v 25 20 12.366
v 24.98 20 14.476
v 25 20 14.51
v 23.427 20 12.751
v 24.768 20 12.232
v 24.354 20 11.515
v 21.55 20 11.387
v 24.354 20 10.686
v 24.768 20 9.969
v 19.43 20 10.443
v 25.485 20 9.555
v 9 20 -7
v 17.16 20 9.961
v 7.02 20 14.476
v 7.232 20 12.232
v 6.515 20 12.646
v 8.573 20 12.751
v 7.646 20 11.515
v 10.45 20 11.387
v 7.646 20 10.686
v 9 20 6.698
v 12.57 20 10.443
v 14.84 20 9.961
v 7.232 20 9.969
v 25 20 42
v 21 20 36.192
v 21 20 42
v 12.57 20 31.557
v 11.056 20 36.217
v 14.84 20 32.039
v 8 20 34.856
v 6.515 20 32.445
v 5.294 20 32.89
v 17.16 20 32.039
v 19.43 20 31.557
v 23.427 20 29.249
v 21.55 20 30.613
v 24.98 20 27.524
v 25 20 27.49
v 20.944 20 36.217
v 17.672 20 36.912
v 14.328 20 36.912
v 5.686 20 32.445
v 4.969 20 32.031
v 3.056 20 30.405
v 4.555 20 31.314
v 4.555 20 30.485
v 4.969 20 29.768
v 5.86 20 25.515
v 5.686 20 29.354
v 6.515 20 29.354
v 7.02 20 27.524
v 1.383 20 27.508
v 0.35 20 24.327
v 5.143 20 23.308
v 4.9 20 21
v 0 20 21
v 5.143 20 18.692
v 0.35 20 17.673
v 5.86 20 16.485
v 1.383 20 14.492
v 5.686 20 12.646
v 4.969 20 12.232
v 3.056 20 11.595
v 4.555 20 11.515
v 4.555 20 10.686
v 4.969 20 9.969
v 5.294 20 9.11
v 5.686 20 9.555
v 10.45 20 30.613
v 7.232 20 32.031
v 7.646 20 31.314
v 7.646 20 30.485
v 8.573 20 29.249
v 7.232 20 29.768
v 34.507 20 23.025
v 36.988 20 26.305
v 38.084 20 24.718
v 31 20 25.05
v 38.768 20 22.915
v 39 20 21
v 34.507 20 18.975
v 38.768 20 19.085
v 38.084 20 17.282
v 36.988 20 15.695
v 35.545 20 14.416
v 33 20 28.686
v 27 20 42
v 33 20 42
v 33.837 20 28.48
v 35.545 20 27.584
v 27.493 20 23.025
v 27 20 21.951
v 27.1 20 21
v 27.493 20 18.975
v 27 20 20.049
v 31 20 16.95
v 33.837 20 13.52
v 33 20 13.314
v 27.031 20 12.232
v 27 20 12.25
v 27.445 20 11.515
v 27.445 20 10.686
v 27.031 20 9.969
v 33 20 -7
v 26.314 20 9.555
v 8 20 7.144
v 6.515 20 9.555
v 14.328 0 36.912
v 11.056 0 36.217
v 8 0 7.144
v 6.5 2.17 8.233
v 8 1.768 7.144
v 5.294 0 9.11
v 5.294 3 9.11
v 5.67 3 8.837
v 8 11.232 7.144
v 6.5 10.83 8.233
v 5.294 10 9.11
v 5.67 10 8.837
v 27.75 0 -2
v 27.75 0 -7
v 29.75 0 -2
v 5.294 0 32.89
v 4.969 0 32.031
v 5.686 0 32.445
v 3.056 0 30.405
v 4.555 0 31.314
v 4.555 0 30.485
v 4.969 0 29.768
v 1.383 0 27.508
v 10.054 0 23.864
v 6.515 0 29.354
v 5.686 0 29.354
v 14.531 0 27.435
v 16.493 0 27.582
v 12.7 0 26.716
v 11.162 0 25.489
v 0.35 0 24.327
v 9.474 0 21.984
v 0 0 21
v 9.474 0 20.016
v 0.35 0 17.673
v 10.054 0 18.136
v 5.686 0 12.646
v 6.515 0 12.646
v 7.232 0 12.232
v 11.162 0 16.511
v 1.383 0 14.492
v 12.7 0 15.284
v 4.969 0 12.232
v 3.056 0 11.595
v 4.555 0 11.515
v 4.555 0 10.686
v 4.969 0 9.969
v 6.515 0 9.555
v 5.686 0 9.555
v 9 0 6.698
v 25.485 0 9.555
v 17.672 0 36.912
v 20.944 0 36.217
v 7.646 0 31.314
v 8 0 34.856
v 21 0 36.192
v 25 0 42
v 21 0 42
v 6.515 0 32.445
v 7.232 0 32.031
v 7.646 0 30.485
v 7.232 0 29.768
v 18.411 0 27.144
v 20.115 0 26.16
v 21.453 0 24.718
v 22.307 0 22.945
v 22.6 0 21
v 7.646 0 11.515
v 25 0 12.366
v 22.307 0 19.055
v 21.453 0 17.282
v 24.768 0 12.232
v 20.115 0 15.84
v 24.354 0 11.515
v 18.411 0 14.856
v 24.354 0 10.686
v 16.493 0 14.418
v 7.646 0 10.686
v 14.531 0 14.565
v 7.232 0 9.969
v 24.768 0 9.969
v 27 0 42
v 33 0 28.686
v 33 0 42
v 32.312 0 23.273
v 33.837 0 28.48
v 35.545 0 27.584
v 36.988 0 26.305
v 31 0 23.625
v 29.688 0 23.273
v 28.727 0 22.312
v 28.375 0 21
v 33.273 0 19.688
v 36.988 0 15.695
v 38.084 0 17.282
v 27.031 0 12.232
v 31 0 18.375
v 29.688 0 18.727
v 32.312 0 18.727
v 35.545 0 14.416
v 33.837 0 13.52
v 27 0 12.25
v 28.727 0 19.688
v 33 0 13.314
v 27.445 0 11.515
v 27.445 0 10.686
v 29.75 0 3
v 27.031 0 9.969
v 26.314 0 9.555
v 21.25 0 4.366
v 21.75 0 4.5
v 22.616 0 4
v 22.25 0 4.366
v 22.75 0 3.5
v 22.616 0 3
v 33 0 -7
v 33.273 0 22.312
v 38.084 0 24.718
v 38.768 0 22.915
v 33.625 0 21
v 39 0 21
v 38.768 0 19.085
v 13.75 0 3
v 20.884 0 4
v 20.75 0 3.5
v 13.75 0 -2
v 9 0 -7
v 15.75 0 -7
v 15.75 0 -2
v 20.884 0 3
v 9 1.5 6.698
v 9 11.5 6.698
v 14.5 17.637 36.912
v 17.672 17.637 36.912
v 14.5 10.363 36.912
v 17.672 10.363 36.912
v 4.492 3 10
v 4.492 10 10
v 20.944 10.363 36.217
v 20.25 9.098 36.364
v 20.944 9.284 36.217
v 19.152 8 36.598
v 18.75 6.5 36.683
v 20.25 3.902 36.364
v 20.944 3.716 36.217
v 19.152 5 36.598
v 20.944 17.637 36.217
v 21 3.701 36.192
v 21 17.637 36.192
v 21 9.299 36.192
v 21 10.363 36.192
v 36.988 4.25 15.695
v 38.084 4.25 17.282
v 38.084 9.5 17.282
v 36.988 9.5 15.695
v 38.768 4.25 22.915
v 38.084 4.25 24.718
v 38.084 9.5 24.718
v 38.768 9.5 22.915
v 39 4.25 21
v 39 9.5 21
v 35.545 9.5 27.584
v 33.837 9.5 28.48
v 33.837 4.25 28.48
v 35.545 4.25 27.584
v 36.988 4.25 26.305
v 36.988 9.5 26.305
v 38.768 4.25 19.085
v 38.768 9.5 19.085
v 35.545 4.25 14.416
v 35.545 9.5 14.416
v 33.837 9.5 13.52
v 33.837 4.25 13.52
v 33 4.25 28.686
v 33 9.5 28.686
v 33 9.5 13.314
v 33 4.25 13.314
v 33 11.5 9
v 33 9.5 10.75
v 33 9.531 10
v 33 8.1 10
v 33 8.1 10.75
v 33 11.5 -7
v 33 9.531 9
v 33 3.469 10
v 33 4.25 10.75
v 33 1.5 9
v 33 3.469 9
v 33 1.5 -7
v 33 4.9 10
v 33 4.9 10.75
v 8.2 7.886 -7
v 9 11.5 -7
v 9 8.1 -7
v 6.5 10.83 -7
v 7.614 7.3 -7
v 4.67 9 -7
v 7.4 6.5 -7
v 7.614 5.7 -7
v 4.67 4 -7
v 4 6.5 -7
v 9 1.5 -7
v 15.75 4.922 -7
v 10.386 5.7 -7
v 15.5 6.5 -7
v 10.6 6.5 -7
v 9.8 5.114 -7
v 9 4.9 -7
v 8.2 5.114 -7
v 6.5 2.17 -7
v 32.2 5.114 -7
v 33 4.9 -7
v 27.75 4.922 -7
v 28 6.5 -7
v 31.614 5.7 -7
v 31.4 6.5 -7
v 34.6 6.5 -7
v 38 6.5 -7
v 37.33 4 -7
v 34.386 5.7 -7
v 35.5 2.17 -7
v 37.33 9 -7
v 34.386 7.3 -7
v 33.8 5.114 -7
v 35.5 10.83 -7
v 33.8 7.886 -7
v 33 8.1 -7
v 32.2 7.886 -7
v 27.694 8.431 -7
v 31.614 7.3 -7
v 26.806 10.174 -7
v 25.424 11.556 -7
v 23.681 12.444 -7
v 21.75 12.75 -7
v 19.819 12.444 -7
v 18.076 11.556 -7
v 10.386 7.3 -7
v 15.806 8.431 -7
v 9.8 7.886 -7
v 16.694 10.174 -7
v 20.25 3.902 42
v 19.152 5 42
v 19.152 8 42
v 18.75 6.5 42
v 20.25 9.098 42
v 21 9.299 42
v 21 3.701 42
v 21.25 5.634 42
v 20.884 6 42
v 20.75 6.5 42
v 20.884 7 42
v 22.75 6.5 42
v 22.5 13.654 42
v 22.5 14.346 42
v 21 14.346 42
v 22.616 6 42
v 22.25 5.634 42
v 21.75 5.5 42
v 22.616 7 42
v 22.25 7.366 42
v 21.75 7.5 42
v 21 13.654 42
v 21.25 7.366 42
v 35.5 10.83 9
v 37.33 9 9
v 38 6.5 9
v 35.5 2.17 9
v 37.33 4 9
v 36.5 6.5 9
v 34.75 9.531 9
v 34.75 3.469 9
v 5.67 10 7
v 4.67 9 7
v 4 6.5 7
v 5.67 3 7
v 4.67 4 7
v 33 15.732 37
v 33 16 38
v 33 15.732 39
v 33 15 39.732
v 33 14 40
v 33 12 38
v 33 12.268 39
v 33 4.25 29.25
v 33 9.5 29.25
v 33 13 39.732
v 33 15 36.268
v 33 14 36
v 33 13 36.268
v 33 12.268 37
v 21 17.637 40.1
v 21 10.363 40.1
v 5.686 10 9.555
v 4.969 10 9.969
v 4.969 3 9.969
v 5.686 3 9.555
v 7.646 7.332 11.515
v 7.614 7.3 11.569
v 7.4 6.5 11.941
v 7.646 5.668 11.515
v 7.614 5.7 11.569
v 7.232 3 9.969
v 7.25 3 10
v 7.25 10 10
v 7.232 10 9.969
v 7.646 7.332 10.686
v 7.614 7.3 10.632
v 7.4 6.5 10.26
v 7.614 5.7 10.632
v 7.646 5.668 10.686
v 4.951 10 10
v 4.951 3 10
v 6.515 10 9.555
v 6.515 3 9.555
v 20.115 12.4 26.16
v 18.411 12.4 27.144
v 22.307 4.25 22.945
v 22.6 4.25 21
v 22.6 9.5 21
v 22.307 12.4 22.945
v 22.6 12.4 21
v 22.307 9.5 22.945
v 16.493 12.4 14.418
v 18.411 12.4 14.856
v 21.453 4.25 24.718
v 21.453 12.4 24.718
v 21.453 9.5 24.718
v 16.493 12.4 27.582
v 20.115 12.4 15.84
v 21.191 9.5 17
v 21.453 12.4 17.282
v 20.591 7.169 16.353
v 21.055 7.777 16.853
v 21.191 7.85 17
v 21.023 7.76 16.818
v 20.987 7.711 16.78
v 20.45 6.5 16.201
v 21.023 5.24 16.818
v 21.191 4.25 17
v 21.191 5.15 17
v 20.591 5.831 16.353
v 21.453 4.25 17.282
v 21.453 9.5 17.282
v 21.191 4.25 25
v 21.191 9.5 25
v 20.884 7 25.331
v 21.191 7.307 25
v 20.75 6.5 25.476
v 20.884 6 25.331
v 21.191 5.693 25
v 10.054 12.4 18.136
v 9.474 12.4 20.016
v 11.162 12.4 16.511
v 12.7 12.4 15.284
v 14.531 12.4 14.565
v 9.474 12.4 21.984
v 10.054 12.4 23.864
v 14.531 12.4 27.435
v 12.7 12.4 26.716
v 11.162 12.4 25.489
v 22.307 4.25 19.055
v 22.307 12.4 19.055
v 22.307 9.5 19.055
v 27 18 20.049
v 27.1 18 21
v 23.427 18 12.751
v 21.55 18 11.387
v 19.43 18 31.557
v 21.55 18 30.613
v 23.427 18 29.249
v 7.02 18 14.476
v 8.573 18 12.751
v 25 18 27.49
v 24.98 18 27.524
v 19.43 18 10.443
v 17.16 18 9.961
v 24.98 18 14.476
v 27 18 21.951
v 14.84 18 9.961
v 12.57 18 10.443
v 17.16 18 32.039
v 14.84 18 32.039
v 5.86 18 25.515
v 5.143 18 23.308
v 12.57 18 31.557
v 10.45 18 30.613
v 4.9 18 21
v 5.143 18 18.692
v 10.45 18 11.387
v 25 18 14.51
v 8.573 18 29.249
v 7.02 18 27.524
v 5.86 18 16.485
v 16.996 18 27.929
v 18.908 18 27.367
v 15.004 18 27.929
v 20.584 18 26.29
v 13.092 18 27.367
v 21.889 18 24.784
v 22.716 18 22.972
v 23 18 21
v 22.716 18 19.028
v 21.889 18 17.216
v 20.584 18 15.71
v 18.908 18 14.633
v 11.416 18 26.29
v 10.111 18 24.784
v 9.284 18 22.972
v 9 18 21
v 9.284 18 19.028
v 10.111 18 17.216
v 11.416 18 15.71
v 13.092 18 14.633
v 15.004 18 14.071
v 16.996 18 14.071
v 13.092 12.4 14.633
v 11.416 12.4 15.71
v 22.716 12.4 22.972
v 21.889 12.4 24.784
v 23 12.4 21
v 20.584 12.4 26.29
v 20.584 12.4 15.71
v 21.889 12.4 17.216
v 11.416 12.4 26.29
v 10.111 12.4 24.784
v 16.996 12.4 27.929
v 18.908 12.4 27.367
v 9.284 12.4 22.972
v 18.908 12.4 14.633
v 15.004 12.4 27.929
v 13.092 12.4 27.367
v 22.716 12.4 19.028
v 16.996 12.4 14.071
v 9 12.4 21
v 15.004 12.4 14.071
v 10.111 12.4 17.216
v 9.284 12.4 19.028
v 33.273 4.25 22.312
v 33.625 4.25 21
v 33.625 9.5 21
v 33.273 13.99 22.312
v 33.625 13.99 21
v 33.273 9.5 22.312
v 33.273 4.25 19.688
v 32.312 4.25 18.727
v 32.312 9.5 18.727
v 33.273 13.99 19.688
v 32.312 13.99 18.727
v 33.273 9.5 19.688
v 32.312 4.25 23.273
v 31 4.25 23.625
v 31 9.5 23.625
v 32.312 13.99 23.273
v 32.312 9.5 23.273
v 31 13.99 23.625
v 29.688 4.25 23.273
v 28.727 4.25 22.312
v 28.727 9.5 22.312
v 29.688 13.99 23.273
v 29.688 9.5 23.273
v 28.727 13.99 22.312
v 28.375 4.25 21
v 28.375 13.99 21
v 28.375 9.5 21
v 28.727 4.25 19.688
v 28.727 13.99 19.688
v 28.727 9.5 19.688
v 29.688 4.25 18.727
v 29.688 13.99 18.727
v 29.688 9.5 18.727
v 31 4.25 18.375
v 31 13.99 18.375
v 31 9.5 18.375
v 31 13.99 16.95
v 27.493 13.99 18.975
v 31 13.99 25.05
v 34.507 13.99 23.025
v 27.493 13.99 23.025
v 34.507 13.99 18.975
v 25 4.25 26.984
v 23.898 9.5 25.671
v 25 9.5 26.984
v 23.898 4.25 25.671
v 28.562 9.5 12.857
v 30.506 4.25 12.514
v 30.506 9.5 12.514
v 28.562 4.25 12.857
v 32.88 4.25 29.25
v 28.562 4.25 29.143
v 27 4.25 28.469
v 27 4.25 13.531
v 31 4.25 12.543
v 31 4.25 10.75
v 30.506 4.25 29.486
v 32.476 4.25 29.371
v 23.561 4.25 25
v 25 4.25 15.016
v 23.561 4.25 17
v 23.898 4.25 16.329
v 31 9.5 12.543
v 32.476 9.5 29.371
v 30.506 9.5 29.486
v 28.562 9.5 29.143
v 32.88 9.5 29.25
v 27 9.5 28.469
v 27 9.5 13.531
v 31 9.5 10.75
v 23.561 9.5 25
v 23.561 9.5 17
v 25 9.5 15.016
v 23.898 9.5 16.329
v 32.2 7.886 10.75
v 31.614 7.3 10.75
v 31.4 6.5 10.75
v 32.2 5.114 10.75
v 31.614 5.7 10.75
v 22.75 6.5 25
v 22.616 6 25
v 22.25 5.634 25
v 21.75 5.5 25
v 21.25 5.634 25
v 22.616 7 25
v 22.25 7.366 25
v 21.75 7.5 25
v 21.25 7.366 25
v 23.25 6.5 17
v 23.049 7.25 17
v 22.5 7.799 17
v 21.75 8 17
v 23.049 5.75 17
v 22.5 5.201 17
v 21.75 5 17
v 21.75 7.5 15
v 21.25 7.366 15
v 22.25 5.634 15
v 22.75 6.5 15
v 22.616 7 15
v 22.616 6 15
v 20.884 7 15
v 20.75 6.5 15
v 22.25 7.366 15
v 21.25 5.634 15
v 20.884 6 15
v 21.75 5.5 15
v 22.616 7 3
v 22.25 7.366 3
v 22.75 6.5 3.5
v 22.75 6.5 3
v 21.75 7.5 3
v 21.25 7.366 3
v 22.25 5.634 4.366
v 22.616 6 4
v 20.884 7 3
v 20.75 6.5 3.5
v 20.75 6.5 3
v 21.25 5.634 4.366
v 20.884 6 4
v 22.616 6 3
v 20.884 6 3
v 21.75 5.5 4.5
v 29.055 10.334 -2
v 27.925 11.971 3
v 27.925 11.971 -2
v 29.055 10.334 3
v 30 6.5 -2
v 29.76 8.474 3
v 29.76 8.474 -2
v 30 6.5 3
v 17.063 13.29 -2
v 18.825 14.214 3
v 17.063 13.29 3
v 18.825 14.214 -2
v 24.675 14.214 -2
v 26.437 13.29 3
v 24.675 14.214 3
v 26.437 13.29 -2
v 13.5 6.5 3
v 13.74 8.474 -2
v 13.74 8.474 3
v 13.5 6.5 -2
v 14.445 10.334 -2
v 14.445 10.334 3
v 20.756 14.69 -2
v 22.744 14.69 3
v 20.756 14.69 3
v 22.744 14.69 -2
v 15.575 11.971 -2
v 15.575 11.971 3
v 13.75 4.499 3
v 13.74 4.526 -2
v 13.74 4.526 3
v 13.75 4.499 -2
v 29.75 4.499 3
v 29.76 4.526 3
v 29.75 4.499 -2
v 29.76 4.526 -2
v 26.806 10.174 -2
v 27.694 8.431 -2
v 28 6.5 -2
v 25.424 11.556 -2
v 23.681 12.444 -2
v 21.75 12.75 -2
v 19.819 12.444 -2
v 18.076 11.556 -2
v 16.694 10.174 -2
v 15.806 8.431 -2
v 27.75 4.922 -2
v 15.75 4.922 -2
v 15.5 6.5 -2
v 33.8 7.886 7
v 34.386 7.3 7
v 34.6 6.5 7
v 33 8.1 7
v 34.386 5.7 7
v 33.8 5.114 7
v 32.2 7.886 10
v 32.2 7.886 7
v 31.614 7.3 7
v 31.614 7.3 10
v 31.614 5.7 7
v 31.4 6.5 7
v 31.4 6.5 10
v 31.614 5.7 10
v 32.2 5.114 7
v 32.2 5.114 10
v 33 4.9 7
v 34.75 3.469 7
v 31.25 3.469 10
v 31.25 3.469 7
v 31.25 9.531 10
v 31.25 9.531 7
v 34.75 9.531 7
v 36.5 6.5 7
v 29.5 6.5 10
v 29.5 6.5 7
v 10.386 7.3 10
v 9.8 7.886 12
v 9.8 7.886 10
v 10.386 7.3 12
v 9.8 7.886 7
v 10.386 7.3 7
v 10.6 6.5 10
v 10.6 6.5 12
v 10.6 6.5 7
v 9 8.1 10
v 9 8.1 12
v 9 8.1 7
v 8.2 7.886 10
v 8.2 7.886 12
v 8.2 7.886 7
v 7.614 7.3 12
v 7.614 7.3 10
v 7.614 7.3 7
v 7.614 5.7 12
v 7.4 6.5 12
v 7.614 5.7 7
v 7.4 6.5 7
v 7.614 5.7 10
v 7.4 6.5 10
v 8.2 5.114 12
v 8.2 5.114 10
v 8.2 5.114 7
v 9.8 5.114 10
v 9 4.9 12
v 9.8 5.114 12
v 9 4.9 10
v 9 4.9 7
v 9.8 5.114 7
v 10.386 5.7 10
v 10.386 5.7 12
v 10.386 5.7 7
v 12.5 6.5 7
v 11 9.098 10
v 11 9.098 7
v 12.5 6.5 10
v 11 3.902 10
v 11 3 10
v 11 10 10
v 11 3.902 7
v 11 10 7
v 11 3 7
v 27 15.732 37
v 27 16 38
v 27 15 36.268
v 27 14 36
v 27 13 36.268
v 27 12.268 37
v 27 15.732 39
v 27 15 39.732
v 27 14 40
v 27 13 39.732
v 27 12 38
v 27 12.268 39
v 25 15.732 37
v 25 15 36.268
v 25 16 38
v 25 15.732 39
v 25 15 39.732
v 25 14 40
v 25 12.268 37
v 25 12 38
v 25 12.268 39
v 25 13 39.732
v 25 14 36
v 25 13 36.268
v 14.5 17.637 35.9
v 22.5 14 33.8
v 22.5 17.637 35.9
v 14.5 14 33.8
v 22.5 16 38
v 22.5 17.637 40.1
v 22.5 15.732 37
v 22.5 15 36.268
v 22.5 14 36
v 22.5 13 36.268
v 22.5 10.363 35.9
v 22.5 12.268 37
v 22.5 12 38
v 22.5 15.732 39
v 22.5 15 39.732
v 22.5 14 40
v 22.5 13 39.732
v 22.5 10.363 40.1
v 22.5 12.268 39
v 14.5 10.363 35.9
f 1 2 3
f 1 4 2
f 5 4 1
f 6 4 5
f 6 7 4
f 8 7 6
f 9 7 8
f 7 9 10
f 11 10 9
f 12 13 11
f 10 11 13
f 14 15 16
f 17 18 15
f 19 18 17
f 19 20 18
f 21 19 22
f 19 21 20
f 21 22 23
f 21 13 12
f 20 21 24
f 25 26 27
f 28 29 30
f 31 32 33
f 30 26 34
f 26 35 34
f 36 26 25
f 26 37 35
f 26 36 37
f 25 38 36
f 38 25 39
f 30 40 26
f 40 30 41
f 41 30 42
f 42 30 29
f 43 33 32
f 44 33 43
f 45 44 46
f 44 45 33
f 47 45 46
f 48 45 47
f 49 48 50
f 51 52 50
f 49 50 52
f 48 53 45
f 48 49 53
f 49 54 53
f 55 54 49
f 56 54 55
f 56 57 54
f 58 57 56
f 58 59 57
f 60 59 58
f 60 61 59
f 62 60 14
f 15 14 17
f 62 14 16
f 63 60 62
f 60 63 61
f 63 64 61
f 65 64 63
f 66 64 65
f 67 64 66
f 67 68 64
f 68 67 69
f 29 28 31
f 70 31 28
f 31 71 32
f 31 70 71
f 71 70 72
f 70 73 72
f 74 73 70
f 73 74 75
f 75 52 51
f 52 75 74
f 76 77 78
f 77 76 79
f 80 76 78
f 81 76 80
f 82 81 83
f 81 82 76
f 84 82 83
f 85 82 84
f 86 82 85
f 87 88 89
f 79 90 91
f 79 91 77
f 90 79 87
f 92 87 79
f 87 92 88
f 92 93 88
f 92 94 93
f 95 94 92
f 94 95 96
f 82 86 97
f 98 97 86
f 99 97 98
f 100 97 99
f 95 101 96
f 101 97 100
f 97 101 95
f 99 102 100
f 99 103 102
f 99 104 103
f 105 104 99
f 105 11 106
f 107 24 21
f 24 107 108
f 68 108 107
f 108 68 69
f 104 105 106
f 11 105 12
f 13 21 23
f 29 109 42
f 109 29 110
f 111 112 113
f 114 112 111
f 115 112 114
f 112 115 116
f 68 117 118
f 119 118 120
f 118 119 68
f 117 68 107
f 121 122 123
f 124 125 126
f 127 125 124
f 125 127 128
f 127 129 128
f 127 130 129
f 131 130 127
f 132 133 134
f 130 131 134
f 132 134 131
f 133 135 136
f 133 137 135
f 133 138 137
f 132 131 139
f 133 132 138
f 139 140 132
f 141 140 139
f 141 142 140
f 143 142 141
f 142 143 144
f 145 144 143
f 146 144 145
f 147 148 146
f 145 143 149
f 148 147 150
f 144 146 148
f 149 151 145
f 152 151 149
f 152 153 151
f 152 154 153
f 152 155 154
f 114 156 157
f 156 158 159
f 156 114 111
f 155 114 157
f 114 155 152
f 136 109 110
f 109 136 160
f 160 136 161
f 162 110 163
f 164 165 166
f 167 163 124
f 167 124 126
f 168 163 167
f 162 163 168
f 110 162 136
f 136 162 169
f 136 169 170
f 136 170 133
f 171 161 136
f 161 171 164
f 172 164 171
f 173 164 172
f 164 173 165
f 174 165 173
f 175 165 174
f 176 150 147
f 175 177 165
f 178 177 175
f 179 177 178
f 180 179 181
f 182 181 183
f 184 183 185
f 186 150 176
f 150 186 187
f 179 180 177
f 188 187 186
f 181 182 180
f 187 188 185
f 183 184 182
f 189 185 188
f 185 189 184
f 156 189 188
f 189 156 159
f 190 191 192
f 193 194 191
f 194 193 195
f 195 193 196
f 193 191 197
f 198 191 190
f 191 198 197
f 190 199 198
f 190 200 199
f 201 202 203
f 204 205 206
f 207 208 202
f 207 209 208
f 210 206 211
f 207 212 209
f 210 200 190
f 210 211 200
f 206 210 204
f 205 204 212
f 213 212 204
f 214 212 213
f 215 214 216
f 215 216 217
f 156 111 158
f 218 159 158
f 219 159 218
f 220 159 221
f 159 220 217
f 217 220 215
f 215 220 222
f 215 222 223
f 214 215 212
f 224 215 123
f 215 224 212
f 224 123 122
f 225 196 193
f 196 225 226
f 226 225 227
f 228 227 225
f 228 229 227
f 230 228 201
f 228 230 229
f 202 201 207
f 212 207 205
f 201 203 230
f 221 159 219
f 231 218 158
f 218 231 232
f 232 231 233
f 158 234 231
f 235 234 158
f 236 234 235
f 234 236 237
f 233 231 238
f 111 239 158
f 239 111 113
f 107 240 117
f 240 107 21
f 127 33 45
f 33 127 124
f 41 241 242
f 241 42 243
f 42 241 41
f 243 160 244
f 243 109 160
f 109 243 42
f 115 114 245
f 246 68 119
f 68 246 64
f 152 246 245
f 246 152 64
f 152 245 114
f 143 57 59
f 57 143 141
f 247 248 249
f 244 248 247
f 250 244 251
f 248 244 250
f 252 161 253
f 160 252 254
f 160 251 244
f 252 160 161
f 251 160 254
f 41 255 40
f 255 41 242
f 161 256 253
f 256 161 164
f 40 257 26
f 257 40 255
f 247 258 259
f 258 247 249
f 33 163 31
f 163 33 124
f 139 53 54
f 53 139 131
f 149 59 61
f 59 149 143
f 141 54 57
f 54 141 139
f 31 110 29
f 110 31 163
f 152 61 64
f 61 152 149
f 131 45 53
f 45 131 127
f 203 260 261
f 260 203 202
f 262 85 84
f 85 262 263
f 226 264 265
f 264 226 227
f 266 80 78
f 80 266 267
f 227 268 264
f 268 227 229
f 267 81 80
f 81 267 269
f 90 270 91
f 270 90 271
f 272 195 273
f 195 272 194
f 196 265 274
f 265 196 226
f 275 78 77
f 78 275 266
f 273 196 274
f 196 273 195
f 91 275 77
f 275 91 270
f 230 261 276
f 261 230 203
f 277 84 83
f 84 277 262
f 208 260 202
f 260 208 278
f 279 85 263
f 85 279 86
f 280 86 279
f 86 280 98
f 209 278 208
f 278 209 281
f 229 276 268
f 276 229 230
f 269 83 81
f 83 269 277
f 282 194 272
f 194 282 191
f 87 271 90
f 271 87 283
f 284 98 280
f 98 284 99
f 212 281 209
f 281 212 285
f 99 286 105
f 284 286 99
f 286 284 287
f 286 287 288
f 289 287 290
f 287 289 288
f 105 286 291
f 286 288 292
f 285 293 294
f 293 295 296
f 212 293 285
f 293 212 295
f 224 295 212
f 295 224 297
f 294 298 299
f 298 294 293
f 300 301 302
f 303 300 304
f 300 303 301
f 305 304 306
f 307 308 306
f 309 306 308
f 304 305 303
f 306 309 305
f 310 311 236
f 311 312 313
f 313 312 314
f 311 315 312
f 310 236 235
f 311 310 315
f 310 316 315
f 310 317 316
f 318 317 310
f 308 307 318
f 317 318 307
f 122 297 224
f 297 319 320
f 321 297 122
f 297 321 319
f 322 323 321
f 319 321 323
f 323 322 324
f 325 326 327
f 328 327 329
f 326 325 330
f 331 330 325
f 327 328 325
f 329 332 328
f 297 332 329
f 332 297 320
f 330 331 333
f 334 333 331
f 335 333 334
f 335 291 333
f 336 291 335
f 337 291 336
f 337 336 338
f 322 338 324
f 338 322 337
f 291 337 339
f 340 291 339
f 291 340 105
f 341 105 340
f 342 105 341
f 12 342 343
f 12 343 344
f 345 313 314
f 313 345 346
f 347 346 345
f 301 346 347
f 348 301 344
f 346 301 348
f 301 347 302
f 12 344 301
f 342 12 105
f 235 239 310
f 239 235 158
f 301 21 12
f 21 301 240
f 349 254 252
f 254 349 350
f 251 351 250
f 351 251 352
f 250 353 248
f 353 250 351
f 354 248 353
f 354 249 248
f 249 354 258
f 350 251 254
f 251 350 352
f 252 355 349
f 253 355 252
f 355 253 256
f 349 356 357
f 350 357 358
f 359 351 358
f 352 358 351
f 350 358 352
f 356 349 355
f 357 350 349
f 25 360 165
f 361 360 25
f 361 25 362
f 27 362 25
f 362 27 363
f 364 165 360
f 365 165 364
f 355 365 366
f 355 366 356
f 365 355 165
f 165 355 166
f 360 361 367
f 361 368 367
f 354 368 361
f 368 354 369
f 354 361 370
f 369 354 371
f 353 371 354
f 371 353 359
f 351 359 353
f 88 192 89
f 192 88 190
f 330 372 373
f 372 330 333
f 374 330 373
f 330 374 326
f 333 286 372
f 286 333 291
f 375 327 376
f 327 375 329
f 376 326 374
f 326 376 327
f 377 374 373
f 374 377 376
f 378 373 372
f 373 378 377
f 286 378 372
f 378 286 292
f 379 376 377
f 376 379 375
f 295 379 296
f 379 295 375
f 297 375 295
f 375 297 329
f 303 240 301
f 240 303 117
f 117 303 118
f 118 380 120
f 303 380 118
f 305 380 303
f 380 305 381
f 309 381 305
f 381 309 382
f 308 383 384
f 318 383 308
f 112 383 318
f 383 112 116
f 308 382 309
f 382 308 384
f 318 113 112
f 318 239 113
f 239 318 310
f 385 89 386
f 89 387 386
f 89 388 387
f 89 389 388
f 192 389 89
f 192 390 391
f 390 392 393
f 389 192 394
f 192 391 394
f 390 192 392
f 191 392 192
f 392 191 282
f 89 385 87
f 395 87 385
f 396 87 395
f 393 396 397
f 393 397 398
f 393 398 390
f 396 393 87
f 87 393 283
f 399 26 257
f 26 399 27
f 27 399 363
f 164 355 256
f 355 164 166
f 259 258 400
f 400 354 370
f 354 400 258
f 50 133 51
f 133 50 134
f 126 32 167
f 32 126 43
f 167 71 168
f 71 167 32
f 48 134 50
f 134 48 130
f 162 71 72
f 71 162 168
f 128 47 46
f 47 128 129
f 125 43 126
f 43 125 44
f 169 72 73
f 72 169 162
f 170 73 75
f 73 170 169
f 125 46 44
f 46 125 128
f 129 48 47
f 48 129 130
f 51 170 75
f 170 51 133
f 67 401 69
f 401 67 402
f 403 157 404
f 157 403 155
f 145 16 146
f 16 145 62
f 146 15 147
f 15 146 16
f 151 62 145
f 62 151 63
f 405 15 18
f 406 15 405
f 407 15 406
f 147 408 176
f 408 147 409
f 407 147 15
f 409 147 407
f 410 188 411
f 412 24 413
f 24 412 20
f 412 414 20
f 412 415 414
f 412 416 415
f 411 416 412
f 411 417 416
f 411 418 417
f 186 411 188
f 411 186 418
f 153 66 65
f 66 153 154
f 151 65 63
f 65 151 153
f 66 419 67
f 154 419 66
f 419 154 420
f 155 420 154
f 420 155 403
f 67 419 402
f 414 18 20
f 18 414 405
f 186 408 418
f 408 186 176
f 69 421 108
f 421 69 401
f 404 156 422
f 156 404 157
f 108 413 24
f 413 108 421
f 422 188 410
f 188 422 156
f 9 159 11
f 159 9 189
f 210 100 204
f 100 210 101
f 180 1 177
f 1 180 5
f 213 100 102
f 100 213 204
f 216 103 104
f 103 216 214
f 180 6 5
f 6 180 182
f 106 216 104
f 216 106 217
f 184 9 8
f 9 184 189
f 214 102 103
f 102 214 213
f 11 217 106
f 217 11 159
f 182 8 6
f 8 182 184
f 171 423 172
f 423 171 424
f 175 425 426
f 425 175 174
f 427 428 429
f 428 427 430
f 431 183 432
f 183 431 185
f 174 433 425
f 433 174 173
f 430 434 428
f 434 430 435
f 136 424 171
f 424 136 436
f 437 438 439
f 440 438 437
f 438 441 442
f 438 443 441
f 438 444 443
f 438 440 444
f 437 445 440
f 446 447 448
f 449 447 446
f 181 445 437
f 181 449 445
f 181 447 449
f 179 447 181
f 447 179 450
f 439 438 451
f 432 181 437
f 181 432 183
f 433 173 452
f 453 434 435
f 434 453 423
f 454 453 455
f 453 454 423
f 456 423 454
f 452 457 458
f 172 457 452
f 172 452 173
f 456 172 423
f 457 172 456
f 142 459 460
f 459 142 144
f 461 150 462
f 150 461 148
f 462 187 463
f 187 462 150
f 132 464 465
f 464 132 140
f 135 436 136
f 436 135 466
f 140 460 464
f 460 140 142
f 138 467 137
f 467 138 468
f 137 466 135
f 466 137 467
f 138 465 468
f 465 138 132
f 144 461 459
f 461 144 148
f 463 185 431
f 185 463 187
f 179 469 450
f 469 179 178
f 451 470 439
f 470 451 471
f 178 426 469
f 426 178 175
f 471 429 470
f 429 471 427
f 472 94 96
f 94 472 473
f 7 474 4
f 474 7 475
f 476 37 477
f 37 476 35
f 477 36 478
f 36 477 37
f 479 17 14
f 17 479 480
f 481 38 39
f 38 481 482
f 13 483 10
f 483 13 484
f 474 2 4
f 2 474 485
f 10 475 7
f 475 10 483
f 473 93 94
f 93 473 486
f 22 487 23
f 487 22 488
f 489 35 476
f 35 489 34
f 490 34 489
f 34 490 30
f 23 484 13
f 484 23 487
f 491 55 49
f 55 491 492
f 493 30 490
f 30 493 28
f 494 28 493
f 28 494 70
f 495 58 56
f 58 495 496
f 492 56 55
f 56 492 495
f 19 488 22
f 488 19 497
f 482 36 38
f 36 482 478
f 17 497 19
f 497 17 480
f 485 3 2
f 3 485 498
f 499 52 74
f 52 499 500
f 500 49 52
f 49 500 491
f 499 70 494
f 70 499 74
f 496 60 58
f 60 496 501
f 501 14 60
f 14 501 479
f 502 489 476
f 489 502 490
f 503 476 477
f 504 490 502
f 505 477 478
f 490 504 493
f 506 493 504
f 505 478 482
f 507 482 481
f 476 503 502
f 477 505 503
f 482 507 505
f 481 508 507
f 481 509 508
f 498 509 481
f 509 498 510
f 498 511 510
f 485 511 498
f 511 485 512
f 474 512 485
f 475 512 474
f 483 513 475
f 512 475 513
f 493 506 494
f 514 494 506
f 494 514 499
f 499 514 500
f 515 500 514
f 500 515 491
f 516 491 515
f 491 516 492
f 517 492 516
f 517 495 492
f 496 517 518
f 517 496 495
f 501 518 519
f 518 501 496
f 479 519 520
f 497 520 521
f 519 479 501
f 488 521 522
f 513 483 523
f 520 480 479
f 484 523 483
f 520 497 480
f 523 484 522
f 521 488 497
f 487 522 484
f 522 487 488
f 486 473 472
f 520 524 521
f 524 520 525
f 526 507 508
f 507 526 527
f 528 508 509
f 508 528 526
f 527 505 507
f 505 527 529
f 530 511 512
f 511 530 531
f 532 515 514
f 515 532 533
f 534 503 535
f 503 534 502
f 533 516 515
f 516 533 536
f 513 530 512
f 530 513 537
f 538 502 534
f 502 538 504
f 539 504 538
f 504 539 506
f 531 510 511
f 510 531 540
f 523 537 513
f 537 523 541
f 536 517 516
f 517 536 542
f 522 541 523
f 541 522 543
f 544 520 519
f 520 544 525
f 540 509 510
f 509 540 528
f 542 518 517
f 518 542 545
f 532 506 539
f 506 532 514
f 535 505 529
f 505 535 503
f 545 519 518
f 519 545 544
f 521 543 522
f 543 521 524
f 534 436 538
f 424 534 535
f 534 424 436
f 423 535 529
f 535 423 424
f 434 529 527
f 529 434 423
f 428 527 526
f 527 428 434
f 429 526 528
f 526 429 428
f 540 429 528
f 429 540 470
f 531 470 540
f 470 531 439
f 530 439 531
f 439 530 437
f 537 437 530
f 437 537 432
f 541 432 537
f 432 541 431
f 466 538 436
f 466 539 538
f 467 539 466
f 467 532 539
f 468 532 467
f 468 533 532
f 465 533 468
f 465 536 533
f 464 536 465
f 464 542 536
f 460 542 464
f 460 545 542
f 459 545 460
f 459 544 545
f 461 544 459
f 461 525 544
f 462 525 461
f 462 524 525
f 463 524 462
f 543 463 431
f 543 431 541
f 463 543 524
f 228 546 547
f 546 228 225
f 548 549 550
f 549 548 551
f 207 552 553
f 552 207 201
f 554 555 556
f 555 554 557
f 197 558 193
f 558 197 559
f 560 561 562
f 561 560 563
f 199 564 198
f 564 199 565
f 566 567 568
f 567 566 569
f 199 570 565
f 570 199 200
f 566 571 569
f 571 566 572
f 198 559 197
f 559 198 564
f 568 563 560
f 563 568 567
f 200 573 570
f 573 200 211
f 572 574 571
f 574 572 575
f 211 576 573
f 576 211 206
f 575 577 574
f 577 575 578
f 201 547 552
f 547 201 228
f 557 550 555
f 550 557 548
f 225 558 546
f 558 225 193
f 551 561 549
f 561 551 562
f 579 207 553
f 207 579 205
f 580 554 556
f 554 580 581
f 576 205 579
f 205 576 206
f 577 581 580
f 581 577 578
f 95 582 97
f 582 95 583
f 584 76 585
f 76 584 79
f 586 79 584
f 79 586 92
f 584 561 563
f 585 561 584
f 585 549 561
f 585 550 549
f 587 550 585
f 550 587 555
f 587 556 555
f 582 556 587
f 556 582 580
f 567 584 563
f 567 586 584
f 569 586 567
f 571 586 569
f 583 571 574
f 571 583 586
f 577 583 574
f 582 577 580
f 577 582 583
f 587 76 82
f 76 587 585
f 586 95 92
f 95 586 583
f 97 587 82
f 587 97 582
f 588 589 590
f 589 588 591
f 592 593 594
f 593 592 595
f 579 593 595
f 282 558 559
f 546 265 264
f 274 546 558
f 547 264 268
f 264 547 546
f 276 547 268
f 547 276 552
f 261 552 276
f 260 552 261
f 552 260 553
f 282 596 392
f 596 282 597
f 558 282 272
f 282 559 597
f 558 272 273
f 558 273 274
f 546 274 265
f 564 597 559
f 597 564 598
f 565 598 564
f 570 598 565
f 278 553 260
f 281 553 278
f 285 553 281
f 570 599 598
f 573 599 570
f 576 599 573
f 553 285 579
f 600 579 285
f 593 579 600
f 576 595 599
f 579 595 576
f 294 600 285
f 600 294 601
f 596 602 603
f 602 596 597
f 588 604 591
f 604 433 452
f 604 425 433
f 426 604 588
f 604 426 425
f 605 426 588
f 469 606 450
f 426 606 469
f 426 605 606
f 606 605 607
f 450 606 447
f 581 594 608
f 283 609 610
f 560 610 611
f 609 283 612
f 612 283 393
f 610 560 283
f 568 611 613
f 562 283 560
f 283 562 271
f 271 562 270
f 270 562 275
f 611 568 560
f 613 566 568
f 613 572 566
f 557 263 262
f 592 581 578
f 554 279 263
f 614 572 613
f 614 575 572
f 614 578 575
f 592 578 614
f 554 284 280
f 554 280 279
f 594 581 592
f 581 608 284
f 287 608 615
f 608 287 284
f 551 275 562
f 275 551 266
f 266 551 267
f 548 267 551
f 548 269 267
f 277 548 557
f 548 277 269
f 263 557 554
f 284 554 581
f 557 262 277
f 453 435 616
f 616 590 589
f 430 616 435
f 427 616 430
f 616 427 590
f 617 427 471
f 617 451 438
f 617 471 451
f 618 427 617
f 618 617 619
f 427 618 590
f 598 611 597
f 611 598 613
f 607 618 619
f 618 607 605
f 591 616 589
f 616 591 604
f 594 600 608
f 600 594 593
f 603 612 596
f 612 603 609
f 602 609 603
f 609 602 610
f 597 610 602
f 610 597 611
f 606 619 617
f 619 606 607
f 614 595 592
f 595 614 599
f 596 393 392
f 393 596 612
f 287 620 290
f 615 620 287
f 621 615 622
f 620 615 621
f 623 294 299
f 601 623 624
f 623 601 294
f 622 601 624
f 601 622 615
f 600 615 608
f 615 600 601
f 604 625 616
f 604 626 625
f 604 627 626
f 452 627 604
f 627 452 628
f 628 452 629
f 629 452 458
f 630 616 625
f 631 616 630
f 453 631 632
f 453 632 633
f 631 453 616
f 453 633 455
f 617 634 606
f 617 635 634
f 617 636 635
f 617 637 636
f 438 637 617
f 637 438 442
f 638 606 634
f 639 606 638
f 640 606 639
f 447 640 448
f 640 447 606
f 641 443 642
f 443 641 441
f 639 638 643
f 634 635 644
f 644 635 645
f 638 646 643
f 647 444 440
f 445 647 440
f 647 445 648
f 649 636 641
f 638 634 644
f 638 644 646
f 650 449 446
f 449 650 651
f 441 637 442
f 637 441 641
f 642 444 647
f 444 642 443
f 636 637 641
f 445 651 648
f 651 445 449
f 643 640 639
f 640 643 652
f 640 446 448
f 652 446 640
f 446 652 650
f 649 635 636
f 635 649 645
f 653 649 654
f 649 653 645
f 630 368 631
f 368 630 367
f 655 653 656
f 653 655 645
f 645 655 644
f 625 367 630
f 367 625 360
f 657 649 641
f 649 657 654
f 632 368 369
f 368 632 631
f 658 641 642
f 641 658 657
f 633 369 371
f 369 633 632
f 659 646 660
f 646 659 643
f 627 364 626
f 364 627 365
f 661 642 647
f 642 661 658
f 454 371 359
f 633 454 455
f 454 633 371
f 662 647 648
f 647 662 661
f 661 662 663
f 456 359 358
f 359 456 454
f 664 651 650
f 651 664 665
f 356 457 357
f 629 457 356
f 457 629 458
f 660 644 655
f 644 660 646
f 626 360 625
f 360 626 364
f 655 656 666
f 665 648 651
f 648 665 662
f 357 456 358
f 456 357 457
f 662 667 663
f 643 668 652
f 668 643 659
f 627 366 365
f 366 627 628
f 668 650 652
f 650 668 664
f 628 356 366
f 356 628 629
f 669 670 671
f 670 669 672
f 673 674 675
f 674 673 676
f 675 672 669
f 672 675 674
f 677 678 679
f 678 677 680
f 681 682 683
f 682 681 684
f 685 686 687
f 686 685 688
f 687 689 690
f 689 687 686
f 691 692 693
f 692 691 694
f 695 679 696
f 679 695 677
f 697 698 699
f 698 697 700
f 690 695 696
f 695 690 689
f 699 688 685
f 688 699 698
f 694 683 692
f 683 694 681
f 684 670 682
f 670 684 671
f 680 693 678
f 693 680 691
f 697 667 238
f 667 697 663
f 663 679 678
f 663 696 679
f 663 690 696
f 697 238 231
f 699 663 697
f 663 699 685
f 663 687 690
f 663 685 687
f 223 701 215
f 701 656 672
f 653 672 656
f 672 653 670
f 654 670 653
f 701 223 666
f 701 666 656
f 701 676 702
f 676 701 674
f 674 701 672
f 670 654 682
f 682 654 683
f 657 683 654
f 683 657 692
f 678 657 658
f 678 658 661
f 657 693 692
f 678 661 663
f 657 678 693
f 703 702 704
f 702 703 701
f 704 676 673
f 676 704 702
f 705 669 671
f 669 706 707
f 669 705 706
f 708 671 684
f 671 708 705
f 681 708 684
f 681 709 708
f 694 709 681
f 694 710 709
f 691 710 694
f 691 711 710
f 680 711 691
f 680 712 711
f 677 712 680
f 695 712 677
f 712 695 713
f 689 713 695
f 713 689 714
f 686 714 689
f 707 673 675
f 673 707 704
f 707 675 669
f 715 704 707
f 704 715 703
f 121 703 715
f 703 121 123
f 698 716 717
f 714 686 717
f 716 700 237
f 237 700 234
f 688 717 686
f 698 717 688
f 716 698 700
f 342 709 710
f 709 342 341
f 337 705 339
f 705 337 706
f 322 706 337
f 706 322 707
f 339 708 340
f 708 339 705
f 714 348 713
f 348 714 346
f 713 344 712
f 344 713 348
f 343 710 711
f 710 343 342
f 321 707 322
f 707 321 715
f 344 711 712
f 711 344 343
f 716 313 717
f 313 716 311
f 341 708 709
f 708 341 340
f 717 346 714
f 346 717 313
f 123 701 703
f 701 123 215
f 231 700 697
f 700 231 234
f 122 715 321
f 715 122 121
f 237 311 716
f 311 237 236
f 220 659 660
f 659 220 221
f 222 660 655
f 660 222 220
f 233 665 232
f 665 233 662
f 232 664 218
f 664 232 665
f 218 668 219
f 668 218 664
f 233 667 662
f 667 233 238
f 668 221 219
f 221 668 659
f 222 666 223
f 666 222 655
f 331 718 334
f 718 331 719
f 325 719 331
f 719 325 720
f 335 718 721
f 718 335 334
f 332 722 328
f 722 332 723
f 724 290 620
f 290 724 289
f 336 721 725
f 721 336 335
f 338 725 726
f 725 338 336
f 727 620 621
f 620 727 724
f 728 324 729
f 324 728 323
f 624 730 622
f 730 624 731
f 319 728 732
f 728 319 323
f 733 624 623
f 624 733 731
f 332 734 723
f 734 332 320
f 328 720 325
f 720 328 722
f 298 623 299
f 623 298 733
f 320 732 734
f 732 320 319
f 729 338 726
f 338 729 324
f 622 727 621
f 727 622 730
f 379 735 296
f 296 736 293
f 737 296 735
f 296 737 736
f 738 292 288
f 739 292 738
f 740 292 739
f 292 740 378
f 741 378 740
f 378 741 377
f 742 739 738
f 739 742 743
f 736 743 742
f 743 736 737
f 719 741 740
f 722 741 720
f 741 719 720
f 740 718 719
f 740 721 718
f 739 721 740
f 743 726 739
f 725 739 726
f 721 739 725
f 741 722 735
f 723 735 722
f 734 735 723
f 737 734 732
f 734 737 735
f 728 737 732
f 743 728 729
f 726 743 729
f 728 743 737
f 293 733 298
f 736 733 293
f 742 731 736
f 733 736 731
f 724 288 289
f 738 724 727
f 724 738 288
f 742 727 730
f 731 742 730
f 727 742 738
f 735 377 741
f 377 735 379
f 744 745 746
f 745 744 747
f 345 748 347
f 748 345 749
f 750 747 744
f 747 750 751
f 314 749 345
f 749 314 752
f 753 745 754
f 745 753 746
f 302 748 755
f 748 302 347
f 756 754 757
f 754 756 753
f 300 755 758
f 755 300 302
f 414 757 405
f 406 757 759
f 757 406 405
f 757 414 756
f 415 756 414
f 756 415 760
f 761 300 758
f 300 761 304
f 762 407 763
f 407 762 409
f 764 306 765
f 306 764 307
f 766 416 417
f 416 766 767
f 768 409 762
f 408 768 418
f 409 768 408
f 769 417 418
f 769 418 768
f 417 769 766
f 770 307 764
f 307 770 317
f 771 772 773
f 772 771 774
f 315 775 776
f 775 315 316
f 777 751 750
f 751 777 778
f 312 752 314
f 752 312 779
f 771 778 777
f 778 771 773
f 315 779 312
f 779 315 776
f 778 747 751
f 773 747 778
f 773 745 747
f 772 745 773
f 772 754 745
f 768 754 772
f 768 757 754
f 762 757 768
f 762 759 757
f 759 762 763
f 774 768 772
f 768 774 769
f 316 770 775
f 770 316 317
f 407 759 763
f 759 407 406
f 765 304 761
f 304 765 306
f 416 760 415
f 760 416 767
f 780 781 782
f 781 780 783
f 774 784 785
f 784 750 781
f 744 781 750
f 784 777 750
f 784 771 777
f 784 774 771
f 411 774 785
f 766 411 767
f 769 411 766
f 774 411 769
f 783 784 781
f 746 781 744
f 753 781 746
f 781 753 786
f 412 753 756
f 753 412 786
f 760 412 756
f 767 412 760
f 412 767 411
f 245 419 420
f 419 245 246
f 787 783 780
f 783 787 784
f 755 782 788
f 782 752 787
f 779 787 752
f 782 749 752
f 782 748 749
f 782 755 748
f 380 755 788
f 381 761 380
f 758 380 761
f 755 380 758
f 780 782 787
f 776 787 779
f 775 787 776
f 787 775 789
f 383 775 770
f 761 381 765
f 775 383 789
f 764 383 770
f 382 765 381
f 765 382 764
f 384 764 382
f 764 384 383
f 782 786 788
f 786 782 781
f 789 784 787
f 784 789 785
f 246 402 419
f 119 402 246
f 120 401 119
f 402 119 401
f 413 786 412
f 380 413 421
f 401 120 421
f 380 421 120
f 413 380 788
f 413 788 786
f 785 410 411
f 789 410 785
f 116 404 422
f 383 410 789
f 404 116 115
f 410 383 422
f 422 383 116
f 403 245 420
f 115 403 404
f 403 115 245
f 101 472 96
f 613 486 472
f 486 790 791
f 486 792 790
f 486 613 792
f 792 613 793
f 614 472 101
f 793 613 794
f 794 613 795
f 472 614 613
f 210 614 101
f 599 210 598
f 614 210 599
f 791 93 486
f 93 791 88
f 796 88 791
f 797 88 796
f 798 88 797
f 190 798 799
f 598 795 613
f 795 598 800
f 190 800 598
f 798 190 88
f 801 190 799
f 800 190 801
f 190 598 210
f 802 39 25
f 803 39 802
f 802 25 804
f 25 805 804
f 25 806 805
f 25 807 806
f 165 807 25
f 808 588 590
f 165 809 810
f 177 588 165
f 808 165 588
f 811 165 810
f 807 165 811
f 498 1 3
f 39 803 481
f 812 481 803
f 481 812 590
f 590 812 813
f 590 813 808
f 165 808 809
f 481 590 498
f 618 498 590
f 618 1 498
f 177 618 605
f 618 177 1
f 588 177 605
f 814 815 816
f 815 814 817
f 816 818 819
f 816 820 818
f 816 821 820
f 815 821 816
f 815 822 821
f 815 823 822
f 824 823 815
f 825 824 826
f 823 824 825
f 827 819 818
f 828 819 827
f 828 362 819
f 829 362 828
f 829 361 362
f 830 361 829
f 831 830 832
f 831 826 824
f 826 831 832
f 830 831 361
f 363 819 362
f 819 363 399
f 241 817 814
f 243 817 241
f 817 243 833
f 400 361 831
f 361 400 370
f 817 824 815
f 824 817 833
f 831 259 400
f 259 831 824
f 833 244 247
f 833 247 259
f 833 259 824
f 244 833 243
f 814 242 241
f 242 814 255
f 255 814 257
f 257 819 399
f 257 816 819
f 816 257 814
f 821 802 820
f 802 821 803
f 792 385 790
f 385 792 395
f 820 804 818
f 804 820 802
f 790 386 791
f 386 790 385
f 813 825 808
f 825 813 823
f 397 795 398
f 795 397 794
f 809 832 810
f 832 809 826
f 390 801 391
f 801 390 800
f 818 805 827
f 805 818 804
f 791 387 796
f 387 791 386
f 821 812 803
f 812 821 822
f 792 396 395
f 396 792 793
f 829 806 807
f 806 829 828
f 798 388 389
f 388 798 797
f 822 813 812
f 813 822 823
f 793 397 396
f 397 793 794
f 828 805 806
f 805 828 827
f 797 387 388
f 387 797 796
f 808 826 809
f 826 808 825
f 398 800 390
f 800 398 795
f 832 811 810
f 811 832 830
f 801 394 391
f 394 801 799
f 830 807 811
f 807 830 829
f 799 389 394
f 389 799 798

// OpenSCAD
difference() {
	
	union() {
		//main cylinder
		translate([16,20,21]) rotate([90,0,0]) cylinder(h=20, r=16);//cube([44, 20, 42]);
		
		//bearing mount
		translate([31,20,21]) rotate([90,0,0]) cylinder (h=20, r=8);
		
		//V3 Mount
		translate([9,0,-7]) cube([24, 20, 22]);
		
		//filament support
		translate([21.75,6.5,34]) rotate([0,0,0]) cylinder (h=8, r=3, $fn=12);
		
		//groovemount supports
		translate([33,6.5,-7]) rotate([0,0,0]) cylinder (h=16, r=5, $fn=12);
		translate([9,6.5,-7]) rotate([0,0,0]) cylinder (h=16, r=5, $fn=12);
		
		//clamp
		translate([21,0,28]) cube([12, 20, 14]);
	}
	
	//pulley opening
	translate([16,21,21]) rotate([90,0,0]){
		cylinder (h=22, r=6.6);
		
		rotate([0,0,45]) {
		//translate([14,0,0]) cylinder(h=22, r=1.6, $fn=12);
		translate([0,14,0]) cylinder(h=22, r=1.6, $fn=12);
		translate([-14,0,0]) cylinder(h=22, r=1.6, $fn=12);
		translate([0,-14,0]) cylinder(h=22, r=1.6, $fn=12);
		}
	}
	
	//gearhead indentation
	translate([16,20.01,21]) rotate([90,0,0]) cylinder (h=2.01, r=11.1);

	//pulley hub indentation
	translate([16,20-2,21]) rotate([90,0,0]) cylinder (h=5.6, r=7);
	
	//bearing screws
	translate([31,21,21]) rotate([90,0,0]) cylinder (h=22, r=2.625, $fn=12); //precision m5
	//translate([31,21,21]) rotate([90,0,0]) cylinder (h=22, r=2.6, $fn=12); //regular M5 screw
	translate([31,22,21]) rotate([90,30,0]) cylinder (h=8.01, r=8.1/2, $fn=6); //M4
	//#translate([31,22,21]) rotate([90,30,0]) cylinder (h=8.01, r=4.7, $fn=6); //M5
	
	//bearing
	translate([31,9.5,21]) rotate([90,0,0]) cylinder (h=5.25, r=8.5);
	translate([31,9.5-5.25,21-8.25-2]) cube([20, 5.25, 18.5]);
	//opening between bearing and pulley
	translate([20,9.5-5.25,21-8.25+3.25+1]) cube([10, 5.25, 8]);

	//filament path chamfer
	translate([21.75,6.5,15]) rotate([0,0,0]) cylinder (h=2, r1=1, r2=1.5, $fn=12);		
	
	//filament path
	#translate([21.75,6.5,-10]) rotate([0,0,0]) cylinder (h=60, r=1, $fn=12); 
	
	//V3 Mount
	translate([21.75,6.5,-2]) rotate([0,0,0]) cylinder (h=5, r=8.25);
	translate([21.75,6.5,-8]) rotate([0,0,0]) cylinder (h=7, r=6.25);
	translate([21.75-8,6.5-8,-2]) cube([16, 8, 5]);
	translate([21.75-6,6.5-7,-8]) cube([12, 7, 7]);
	translate([21.75,6.5,3.5]) rotate([90,0,0]) cylinder (h=10, r=1,  $fn=12);
	
	//groovemount supports
	translate([33,6.5,-8]) rotate([0,0,0]) cylinder (h=20, r=1.6, $fn=12);
	translate([33,6.5,7]) rotate([0,0,0]) cylinder (h=3, r=3.5, $fn=6);
	
	translate([9,6.5,-8]) rotate([0,0,0]) cylinder (h=20, r=1.6, $fn=12);
	translate([9,6.5,7]) rotate([0,0,0]) cylinder (h=3, r=3.5, $fn=6);
	translate([3,3,7]) cube([8, 7, 3]);
	
	//clamp slit
	translate([25,-1,10]) cube([2, 22, 35]);
	//clamp nut
	translate([14.5,14,38]) rotate([0,90,0]) cylinder (h=8, r=4.2, $fn=6);
	//clamp screw hole
	translate([15,14,38]) rotate([0,90,0]) cylinder (h=20, r=2, $fn=12);
}
